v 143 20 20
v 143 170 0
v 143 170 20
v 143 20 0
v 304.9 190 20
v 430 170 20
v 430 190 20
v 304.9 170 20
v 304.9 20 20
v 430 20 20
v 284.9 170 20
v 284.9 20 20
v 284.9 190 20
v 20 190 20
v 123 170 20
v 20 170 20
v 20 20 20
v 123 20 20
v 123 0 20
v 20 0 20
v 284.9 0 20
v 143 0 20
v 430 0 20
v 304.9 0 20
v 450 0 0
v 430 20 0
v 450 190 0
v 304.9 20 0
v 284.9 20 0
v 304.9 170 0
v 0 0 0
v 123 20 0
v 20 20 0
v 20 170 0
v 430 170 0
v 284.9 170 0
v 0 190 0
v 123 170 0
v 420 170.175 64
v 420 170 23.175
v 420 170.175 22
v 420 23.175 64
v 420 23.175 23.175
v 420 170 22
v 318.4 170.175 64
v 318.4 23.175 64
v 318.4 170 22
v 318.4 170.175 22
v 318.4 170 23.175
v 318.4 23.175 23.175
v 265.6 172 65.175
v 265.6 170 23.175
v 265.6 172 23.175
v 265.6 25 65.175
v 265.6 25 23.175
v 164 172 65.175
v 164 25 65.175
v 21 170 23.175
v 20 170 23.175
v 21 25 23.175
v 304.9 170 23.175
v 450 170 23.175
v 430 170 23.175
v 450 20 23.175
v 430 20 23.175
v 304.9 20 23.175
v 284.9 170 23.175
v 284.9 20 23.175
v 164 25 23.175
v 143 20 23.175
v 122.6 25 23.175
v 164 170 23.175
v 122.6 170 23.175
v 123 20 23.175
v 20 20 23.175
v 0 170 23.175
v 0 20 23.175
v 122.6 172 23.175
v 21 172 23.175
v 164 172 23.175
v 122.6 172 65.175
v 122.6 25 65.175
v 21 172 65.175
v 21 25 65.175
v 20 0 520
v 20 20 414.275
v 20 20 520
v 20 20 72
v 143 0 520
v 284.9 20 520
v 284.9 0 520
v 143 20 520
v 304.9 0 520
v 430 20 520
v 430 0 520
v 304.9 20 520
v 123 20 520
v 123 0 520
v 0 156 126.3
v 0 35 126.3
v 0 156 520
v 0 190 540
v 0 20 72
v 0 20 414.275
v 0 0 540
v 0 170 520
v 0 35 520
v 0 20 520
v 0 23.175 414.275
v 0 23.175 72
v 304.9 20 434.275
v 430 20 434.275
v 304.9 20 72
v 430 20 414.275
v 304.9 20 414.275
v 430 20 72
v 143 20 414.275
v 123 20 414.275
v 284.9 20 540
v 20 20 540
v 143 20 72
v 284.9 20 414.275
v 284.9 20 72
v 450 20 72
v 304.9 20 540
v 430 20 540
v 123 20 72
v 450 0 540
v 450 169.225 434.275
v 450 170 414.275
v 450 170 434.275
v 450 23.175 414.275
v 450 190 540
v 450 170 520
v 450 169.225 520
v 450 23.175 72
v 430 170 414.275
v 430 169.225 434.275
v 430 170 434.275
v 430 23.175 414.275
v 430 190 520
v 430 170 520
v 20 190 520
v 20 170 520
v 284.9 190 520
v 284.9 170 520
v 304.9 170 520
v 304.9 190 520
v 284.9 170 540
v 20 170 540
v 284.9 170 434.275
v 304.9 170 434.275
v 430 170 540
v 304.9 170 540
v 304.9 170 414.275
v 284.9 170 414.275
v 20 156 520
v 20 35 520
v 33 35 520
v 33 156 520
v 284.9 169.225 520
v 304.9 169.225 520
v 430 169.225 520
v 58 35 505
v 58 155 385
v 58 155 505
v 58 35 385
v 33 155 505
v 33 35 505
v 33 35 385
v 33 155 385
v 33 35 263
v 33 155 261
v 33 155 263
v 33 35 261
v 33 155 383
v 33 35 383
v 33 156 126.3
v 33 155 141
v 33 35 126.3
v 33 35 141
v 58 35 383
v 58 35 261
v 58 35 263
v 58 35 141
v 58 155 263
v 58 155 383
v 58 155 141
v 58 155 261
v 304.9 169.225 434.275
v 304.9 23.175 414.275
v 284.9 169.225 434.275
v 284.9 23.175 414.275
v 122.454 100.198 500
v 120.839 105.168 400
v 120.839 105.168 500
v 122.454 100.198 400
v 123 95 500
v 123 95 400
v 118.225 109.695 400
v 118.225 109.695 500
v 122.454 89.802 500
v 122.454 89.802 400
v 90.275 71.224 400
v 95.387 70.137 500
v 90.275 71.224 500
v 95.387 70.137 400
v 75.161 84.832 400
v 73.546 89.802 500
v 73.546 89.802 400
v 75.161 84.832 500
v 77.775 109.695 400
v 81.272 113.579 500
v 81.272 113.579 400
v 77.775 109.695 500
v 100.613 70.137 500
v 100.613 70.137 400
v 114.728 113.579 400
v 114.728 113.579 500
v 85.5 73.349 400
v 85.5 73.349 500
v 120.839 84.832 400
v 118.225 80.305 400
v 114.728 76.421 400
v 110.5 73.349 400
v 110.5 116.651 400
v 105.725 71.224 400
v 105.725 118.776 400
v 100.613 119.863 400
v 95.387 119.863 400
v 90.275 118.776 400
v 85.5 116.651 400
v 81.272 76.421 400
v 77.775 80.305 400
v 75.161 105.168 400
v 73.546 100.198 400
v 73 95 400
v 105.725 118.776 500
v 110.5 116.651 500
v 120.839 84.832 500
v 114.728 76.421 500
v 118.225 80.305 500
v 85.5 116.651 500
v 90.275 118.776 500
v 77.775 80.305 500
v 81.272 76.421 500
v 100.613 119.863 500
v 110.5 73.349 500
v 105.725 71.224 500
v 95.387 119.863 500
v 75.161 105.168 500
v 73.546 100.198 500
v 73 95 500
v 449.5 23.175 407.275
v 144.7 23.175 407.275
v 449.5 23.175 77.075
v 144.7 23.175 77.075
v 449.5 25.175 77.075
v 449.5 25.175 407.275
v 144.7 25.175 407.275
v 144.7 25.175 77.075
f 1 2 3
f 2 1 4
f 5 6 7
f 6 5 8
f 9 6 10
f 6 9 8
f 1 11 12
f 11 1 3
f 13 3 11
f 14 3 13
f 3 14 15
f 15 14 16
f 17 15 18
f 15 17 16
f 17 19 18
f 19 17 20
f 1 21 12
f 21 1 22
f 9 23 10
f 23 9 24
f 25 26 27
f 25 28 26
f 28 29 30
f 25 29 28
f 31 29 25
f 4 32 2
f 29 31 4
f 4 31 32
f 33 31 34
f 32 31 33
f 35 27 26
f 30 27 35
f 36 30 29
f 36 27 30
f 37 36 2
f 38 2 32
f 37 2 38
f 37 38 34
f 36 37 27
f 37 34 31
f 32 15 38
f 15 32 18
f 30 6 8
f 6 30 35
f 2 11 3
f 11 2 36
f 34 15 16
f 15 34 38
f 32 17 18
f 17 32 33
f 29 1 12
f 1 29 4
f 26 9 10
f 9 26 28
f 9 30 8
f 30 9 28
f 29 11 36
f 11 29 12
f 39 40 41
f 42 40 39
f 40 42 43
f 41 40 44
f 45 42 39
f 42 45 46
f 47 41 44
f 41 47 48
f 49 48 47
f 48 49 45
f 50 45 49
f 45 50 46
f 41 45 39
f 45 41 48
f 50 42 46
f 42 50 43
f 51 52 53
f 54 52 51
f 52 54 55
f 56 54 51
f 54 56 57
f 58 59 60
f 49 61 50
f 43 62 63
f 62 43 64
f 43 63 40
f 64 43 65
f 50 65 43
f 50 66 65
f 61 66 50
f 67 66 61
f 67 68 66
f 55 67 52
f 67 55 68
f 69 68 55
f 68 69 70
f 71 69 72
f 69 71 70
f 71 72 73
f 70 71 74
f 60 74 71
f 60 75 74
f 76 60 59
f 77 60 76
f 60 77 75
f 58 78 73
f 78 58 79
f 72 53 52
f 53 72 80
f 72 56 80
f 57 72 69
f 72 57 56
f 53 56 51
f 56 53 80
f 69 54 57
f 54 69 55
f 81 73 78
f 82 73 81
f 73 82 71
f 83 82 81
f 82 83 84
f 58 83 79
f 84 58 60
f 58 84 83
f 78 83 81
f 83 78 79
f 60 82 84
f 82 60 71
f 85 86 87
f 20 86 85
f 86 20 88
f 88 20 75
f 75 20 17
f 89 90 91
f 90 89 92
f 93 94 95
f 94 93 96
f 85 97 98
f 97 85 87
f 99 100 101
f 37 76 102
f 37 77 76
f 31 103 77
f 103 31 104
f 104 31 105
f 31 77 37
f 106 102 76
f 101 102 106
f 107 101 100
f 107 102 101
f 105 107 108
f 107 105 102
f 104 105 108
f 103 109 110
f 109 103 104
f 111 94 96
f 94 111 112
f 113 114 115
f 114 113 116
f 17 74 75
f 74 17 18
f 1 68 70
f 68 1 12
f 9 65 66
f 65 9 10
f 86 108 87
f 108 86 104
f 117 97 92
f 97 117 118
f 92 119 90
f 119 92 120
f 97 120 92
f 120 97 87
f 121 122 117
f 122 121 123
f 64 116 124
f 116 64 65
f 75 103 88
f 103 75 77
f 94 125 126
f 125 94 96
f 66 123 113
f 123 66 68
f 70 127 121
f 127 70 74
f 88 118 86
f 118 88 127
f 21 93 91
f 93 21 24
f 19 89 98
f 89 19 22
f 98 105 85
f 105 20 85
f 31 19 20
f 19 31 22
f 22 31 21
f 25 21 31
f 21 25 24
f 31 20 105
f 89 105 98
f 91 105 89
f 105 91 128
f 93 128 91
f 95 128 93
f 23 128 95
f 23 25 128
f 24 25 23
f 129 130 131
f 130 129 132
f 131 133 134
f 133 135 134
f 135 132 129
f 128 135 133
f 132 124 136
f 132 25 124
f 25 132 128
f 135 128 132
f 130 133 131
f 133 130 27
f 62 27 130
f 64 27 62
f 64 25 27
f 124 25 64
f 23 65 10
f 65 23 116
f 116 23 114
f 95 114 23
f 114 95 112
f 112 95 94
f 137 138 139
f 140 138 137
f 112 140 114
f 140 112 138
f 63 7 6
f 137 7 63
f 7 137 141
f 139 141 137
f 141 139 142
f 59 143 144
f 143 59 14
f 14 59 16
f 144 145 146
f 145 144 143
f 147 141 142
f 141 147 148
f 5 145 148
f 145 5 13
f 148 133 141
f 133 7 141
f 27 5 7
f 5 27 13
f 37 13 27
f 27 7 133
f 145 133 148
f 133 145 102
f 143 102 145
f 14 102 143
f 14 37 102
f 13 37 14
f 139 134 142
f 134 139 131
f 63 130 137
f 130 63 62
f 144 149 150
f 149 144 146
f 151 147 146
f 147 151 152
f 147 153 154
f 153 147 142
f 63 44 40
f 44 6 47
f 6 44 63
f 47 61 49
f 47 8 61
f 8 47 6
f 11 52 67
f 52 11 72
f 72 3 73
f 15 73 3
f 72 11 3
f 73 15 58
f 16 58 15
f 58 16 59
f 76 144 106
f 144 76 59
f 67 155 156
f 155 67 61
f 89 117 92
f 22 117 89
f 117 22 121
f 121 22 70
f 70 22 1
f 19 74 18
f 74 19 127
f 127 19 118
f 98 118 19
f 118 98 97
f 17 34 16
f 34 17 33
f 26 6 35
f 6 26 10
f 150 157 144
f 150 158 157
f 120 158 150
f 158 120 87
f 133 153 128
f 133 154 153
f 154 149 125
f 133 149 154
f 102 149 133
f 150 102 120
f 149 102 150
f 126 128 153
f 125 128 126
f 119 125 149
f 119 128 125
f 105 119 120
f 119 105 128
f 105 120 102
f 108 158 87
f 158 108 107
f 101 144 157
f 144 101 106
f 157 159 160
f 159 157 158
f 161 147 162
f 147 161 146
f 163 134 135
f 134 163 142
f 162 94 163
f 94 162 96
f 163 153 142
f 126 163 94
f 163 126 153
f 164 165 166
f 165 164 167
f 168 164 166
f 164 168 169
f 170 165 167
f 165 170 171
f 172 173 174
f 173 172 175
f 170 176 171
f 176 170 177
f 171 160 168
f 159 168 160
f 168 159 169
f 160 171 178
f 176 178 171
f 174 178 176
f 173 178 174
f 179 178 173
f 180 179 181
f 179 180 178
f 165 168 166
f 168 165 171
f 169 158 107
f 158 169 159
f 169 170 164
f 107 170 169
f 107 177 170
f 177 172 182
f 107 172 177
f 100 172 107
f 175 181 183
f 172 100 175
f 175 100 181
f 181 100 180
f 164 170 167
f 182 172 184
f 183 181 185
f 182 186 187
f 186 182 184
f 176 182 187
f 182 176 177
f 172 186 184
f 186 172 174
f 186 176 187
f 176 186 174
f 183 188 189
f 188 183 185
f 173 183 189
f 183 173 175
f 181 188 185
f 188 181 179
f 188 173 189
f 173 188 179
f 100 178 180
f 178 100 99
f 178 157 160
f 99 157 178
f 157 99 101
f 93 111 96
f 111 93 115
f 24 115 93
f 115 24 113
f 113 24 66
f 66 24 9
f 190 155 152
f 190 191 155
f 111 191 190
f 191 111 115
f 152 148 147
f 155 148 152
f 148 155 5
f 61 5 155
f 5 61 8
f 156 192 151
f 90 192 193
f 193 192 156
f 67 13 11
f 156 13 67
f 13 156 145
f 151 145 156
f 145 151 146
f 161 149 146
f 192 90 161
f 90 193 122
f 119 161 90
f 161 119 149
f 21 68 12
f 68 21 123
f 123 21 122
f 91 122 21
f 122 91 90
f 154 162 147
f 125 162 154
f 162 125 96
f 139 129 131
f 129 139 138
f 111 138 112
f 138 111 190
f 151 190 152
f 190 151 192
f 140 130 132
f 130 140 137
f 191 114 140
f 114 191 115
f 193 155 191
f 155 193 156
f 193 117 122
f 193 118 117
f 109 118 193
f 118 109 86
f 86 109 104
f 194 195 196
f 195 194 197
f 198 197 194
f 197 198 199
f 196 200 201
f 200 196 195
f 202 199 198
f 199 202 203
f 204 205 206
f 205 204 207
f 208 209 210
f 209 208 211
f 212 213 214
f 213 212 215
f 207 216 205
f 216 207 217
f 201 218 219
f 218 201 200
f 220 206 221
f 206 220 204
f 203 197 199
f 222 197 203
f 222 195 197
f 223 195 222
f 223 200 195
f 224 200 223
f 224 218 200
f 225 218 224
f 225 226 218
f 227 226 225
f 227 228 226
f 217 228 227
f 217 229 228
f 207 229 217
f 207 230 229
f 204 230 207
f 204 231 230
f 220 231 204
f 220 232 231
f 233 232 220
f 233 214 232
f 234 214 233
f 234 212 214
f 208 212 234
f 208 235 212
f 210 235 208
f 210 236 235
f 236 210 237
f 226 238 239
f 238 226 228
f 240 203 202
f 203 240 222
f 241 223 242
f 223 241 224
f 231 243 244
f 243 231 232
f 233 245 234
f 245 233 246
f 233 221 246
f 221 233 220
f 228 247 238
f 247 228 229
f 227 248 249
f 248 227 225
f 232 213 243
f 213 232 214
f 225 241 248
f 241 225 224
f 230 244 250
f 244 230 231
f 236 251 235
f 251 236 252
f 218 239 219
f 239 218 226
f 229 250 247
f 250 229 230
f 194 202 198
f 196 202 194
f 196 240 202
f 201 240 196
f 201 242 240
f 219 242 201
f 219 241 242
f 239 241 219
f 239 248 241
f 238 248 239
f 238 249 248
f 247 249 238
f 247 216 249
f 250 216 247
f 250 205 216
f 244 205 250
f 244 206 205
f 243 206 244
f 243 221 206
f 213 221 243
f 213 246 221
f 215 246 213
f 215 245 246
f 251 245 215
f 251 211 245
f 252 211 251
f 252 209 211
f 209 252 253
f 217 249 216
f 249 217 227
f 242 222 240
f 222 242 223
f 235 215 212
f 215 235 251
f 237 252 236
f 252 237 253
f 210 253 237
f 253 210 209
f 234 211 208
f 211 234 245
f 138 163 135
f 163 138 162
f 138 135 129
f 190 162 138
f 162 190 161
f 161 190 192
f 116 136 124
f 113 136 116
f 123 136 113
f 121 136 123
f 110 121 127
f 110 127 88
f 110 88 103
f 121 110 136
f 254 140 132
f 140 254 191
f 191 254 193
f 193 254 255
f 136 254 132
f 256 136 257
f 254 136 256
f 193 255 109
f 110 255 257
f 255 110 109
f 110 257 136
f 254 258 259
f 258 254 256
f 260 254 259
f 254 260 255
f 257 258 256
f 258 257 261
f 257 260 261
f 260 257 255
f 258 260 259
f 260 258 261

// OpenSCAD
function inmm(inch_qnt) = inch_qnt* 25.4;

ext_rad = 20;
extrad2 = (ext_rad*2);

small_ext = [ext_rad, 150, ext_rad]; // these are cheap aluminum extrusions on aliexpress

pillar_ext = [20, 20, 500];
horizontal_ext = [450, 20, 20];


radiator = [33, 121, inmm(15.5)];

// dimensions of a 3.5" hard drive from https://members.snia.org/document/dl/25862
hdd = [101.6, 147, 42];
hdd_mnt = 3.175; //offset of screw mount from edge

fan = [25, 120, 120];

boarddep = inmm(1/8);

mobo_dimm = [inmm(12), 2, inmm(13)];
psu_dimm = [inmm(6+(1/2)), inmm(5+(7/8)), inmm(3+(3/8))];
mnt_board_dimm = [horizontal_ext.x, inmm(1/8), pillar_ext.z-psu_dimm.z-ext_rad-hdd.z-10];

//plywood mounting board

//a small extrusion for supporting the other end of the psu
//translate([psu_dimm.x-ext_rad, ext_rad, 0]) color("sienna") cube(small_ext);
// a small extrusion for supporting hard drives
x_of_small_ext_for_hdd_support = horizontal_ext.x-hdd.x-(ext_rad/2)+hdd_mnt+hdd_mnt-(ext_rad/2);
//translate([x_of_small_ext_for_hdd_support, ext_rad, 0]) color("sienna") cube(small_ext);

color("sienna") {
    translate([radiator.x+fan.x+65, ext_rad, 0]) cube(small_ext);
    translate([horizontal_ext.x-psu_dimm.x, ext_rad, 0]) cube(small_ext);
}

color("NavajoWhite", 0.6) translate([0, ext_rad, ext_rad]) cube([horizontal_ext.x, small_ext.y, boarddep]);

// hard drives
color("green", 0.5) {
    //translate([horizontal_ext.x-hdd.x-(ext_rad/2)+hdd_mnt, ext_rad+boarddep, ext_rad+2]) cube(hdd);
    translate([horizontal_ext.x-hdd.x-ext_rad-10, ext_rad+boarddep, ext_rad+2]) cube(hdd);
    translate([164, ext_rad+5, ext_rad+boarddep]) cube(hdd);
    translate([21, ext_rad+5, ext_rad+boarddep]) cube(hdd);

}


color("white") {
    translate([0, 0, 20]) cube(pillar_ext);
    translate([horizontal_ext.x-ext_rad, 0, 20])    cube(pillar_ext);
    translate([0, ext_rad+small_ext.y, ext_rad])    cube(pillar_ext);
    translate([horizontal_ext.x-ext_rad, ext_rad+small_ext.y, ext_rad]) cube(pillar_ext);
    
    translate([radiator.x+fan.x+65, 0, ext_rad]) cube(pillar_ext);
}

color("sienna") {
    translate([0, ext_rad, 0]) cube(small_ext);
    translate([horizontal_ext.x-ext_rad, ext_rad, 0]) cube(small_ext);
    translate([0, ext_rad, pillar_ext.z+ext_rad]) cube(small_ext);
    translate([horizontal_ext.x-ext_rad, ext_rad, pillar_ext.z+ext_rad]) cube(small_ext);
}

color("red") {
    cube(horizontal_ext);
    translate([0, 0, 20+pillar_ext.z]) cube(horizontal_ext);
    translate([0, small_ext.y+ext_rad, 0]) cube(horizontal_ext);
    translate([0, small_ext.y+ext_rad, 20+pillar_ext.z]) cube(horizontal_ext);
}


// radiator
translate([0, ext_rad+15, (pillar_ext.z-radiator.z)+ext_rad]) color("blue", 0.5) cube(radiator);
//translate([ext_rad, ext_rad+10, (pillar_ext.z-radiator.z)+ext_rad]) color("blue") cube([radiator.z, radiator.y, radiator.x]);

// fans
color("lightblue", 0.6) {
    translate([radiator.x, ext_rad+15, (pillar_ext.z-fan.z)+ext_rad-15]) cube(fan);
    translate([radiator.x, ext_rad+15, (pillar_ext.z-fan.z)+ext_rad-15-120-2]) cube(fan);
    translate([radiator.x, ext_rad+15, (pillar_ext.z-fan.z)+ext_rad-15-120*2-2*2]) cube(fan);
}



//translate([horizontal_ext.x-hdd.x-(ext_rad/2)+hdd_mnt+hdd_mnt-(ext_rad/2), ext_rad+small_ext.y, ext_rad]) color("white") cube(pillar_ext);
translate([horizontal_ext.x-psu_dimm.x, ext_rad+small_ext.y, ext_rad]) color("white") cube(pillar_ext);
translate([horizontal_ext.x-psu_dimm.x, 0, ext_rad]) color("white") cube(pillar_ext);


translate([horizontal_ext.x-psu_dimm.x, ext_rad, pillar_ext.z+ext_rad]) color("sienna") cube(small_ext);

translate([horizontal_ext.x-psu_dimm.x, ext_rad, pillar_ext.z-psu_dimm.z]) color("sienna") cube(small_ext);





//translate([ext_rad, 0, (pillar_ext.z-psu_dimm.z)]) color("red") cube(horizontal_ext);


translate([horizontal_ext.x-ext_rad, ext_rad, (pillar_ext.z-psu_dimm.z)]) color("sienna") cube(small_ext);


// imaginary watercooling reservoir

color("MediumSpringGreen", 0.5) translate([radiator.x+fan.x+40, 95, 400]) cylinder(h=100, r=25);


//psu
translate([horizontal_ext.x-psu_dimm.x, ext_rad, pillar_ext.z-psu_dimm.z+ext_rad]) {
    color("purple", 0.5) cube(psu_dimm);
}


translate([0, ext_rad, ext_rad+hdd.z+10]) {
    color("NavajoWhite", 0.5) cube(mnt_board_dimm);
}

io_pannel_offset = 2.2; // mm amount that the io ports from the mobo extrude off to the left of the mobo. the io plate will go into the acrylic/plywood mounted on the left exterior, that sheet should be boarddep thick. the plat aligns that the io will meet right on the exterior surface of the sheet

// this won't work since io_pannel_offset is smaller than boarddep. so I will provide an approximation that will work because this is just a visualization and sanity test
mobo_x_offset = 0.5;

//mobo
translate([horizontal_ext.x-mobo_dimm.x-mobo_x_offset, ext_rad+mnt_board_dimm.y, pillar_ext.z-psu_dimm.z-mobo_dimm.z-7]) {
    color("black", 0.5) {
        cube(mobo_dimm);
    }
}
